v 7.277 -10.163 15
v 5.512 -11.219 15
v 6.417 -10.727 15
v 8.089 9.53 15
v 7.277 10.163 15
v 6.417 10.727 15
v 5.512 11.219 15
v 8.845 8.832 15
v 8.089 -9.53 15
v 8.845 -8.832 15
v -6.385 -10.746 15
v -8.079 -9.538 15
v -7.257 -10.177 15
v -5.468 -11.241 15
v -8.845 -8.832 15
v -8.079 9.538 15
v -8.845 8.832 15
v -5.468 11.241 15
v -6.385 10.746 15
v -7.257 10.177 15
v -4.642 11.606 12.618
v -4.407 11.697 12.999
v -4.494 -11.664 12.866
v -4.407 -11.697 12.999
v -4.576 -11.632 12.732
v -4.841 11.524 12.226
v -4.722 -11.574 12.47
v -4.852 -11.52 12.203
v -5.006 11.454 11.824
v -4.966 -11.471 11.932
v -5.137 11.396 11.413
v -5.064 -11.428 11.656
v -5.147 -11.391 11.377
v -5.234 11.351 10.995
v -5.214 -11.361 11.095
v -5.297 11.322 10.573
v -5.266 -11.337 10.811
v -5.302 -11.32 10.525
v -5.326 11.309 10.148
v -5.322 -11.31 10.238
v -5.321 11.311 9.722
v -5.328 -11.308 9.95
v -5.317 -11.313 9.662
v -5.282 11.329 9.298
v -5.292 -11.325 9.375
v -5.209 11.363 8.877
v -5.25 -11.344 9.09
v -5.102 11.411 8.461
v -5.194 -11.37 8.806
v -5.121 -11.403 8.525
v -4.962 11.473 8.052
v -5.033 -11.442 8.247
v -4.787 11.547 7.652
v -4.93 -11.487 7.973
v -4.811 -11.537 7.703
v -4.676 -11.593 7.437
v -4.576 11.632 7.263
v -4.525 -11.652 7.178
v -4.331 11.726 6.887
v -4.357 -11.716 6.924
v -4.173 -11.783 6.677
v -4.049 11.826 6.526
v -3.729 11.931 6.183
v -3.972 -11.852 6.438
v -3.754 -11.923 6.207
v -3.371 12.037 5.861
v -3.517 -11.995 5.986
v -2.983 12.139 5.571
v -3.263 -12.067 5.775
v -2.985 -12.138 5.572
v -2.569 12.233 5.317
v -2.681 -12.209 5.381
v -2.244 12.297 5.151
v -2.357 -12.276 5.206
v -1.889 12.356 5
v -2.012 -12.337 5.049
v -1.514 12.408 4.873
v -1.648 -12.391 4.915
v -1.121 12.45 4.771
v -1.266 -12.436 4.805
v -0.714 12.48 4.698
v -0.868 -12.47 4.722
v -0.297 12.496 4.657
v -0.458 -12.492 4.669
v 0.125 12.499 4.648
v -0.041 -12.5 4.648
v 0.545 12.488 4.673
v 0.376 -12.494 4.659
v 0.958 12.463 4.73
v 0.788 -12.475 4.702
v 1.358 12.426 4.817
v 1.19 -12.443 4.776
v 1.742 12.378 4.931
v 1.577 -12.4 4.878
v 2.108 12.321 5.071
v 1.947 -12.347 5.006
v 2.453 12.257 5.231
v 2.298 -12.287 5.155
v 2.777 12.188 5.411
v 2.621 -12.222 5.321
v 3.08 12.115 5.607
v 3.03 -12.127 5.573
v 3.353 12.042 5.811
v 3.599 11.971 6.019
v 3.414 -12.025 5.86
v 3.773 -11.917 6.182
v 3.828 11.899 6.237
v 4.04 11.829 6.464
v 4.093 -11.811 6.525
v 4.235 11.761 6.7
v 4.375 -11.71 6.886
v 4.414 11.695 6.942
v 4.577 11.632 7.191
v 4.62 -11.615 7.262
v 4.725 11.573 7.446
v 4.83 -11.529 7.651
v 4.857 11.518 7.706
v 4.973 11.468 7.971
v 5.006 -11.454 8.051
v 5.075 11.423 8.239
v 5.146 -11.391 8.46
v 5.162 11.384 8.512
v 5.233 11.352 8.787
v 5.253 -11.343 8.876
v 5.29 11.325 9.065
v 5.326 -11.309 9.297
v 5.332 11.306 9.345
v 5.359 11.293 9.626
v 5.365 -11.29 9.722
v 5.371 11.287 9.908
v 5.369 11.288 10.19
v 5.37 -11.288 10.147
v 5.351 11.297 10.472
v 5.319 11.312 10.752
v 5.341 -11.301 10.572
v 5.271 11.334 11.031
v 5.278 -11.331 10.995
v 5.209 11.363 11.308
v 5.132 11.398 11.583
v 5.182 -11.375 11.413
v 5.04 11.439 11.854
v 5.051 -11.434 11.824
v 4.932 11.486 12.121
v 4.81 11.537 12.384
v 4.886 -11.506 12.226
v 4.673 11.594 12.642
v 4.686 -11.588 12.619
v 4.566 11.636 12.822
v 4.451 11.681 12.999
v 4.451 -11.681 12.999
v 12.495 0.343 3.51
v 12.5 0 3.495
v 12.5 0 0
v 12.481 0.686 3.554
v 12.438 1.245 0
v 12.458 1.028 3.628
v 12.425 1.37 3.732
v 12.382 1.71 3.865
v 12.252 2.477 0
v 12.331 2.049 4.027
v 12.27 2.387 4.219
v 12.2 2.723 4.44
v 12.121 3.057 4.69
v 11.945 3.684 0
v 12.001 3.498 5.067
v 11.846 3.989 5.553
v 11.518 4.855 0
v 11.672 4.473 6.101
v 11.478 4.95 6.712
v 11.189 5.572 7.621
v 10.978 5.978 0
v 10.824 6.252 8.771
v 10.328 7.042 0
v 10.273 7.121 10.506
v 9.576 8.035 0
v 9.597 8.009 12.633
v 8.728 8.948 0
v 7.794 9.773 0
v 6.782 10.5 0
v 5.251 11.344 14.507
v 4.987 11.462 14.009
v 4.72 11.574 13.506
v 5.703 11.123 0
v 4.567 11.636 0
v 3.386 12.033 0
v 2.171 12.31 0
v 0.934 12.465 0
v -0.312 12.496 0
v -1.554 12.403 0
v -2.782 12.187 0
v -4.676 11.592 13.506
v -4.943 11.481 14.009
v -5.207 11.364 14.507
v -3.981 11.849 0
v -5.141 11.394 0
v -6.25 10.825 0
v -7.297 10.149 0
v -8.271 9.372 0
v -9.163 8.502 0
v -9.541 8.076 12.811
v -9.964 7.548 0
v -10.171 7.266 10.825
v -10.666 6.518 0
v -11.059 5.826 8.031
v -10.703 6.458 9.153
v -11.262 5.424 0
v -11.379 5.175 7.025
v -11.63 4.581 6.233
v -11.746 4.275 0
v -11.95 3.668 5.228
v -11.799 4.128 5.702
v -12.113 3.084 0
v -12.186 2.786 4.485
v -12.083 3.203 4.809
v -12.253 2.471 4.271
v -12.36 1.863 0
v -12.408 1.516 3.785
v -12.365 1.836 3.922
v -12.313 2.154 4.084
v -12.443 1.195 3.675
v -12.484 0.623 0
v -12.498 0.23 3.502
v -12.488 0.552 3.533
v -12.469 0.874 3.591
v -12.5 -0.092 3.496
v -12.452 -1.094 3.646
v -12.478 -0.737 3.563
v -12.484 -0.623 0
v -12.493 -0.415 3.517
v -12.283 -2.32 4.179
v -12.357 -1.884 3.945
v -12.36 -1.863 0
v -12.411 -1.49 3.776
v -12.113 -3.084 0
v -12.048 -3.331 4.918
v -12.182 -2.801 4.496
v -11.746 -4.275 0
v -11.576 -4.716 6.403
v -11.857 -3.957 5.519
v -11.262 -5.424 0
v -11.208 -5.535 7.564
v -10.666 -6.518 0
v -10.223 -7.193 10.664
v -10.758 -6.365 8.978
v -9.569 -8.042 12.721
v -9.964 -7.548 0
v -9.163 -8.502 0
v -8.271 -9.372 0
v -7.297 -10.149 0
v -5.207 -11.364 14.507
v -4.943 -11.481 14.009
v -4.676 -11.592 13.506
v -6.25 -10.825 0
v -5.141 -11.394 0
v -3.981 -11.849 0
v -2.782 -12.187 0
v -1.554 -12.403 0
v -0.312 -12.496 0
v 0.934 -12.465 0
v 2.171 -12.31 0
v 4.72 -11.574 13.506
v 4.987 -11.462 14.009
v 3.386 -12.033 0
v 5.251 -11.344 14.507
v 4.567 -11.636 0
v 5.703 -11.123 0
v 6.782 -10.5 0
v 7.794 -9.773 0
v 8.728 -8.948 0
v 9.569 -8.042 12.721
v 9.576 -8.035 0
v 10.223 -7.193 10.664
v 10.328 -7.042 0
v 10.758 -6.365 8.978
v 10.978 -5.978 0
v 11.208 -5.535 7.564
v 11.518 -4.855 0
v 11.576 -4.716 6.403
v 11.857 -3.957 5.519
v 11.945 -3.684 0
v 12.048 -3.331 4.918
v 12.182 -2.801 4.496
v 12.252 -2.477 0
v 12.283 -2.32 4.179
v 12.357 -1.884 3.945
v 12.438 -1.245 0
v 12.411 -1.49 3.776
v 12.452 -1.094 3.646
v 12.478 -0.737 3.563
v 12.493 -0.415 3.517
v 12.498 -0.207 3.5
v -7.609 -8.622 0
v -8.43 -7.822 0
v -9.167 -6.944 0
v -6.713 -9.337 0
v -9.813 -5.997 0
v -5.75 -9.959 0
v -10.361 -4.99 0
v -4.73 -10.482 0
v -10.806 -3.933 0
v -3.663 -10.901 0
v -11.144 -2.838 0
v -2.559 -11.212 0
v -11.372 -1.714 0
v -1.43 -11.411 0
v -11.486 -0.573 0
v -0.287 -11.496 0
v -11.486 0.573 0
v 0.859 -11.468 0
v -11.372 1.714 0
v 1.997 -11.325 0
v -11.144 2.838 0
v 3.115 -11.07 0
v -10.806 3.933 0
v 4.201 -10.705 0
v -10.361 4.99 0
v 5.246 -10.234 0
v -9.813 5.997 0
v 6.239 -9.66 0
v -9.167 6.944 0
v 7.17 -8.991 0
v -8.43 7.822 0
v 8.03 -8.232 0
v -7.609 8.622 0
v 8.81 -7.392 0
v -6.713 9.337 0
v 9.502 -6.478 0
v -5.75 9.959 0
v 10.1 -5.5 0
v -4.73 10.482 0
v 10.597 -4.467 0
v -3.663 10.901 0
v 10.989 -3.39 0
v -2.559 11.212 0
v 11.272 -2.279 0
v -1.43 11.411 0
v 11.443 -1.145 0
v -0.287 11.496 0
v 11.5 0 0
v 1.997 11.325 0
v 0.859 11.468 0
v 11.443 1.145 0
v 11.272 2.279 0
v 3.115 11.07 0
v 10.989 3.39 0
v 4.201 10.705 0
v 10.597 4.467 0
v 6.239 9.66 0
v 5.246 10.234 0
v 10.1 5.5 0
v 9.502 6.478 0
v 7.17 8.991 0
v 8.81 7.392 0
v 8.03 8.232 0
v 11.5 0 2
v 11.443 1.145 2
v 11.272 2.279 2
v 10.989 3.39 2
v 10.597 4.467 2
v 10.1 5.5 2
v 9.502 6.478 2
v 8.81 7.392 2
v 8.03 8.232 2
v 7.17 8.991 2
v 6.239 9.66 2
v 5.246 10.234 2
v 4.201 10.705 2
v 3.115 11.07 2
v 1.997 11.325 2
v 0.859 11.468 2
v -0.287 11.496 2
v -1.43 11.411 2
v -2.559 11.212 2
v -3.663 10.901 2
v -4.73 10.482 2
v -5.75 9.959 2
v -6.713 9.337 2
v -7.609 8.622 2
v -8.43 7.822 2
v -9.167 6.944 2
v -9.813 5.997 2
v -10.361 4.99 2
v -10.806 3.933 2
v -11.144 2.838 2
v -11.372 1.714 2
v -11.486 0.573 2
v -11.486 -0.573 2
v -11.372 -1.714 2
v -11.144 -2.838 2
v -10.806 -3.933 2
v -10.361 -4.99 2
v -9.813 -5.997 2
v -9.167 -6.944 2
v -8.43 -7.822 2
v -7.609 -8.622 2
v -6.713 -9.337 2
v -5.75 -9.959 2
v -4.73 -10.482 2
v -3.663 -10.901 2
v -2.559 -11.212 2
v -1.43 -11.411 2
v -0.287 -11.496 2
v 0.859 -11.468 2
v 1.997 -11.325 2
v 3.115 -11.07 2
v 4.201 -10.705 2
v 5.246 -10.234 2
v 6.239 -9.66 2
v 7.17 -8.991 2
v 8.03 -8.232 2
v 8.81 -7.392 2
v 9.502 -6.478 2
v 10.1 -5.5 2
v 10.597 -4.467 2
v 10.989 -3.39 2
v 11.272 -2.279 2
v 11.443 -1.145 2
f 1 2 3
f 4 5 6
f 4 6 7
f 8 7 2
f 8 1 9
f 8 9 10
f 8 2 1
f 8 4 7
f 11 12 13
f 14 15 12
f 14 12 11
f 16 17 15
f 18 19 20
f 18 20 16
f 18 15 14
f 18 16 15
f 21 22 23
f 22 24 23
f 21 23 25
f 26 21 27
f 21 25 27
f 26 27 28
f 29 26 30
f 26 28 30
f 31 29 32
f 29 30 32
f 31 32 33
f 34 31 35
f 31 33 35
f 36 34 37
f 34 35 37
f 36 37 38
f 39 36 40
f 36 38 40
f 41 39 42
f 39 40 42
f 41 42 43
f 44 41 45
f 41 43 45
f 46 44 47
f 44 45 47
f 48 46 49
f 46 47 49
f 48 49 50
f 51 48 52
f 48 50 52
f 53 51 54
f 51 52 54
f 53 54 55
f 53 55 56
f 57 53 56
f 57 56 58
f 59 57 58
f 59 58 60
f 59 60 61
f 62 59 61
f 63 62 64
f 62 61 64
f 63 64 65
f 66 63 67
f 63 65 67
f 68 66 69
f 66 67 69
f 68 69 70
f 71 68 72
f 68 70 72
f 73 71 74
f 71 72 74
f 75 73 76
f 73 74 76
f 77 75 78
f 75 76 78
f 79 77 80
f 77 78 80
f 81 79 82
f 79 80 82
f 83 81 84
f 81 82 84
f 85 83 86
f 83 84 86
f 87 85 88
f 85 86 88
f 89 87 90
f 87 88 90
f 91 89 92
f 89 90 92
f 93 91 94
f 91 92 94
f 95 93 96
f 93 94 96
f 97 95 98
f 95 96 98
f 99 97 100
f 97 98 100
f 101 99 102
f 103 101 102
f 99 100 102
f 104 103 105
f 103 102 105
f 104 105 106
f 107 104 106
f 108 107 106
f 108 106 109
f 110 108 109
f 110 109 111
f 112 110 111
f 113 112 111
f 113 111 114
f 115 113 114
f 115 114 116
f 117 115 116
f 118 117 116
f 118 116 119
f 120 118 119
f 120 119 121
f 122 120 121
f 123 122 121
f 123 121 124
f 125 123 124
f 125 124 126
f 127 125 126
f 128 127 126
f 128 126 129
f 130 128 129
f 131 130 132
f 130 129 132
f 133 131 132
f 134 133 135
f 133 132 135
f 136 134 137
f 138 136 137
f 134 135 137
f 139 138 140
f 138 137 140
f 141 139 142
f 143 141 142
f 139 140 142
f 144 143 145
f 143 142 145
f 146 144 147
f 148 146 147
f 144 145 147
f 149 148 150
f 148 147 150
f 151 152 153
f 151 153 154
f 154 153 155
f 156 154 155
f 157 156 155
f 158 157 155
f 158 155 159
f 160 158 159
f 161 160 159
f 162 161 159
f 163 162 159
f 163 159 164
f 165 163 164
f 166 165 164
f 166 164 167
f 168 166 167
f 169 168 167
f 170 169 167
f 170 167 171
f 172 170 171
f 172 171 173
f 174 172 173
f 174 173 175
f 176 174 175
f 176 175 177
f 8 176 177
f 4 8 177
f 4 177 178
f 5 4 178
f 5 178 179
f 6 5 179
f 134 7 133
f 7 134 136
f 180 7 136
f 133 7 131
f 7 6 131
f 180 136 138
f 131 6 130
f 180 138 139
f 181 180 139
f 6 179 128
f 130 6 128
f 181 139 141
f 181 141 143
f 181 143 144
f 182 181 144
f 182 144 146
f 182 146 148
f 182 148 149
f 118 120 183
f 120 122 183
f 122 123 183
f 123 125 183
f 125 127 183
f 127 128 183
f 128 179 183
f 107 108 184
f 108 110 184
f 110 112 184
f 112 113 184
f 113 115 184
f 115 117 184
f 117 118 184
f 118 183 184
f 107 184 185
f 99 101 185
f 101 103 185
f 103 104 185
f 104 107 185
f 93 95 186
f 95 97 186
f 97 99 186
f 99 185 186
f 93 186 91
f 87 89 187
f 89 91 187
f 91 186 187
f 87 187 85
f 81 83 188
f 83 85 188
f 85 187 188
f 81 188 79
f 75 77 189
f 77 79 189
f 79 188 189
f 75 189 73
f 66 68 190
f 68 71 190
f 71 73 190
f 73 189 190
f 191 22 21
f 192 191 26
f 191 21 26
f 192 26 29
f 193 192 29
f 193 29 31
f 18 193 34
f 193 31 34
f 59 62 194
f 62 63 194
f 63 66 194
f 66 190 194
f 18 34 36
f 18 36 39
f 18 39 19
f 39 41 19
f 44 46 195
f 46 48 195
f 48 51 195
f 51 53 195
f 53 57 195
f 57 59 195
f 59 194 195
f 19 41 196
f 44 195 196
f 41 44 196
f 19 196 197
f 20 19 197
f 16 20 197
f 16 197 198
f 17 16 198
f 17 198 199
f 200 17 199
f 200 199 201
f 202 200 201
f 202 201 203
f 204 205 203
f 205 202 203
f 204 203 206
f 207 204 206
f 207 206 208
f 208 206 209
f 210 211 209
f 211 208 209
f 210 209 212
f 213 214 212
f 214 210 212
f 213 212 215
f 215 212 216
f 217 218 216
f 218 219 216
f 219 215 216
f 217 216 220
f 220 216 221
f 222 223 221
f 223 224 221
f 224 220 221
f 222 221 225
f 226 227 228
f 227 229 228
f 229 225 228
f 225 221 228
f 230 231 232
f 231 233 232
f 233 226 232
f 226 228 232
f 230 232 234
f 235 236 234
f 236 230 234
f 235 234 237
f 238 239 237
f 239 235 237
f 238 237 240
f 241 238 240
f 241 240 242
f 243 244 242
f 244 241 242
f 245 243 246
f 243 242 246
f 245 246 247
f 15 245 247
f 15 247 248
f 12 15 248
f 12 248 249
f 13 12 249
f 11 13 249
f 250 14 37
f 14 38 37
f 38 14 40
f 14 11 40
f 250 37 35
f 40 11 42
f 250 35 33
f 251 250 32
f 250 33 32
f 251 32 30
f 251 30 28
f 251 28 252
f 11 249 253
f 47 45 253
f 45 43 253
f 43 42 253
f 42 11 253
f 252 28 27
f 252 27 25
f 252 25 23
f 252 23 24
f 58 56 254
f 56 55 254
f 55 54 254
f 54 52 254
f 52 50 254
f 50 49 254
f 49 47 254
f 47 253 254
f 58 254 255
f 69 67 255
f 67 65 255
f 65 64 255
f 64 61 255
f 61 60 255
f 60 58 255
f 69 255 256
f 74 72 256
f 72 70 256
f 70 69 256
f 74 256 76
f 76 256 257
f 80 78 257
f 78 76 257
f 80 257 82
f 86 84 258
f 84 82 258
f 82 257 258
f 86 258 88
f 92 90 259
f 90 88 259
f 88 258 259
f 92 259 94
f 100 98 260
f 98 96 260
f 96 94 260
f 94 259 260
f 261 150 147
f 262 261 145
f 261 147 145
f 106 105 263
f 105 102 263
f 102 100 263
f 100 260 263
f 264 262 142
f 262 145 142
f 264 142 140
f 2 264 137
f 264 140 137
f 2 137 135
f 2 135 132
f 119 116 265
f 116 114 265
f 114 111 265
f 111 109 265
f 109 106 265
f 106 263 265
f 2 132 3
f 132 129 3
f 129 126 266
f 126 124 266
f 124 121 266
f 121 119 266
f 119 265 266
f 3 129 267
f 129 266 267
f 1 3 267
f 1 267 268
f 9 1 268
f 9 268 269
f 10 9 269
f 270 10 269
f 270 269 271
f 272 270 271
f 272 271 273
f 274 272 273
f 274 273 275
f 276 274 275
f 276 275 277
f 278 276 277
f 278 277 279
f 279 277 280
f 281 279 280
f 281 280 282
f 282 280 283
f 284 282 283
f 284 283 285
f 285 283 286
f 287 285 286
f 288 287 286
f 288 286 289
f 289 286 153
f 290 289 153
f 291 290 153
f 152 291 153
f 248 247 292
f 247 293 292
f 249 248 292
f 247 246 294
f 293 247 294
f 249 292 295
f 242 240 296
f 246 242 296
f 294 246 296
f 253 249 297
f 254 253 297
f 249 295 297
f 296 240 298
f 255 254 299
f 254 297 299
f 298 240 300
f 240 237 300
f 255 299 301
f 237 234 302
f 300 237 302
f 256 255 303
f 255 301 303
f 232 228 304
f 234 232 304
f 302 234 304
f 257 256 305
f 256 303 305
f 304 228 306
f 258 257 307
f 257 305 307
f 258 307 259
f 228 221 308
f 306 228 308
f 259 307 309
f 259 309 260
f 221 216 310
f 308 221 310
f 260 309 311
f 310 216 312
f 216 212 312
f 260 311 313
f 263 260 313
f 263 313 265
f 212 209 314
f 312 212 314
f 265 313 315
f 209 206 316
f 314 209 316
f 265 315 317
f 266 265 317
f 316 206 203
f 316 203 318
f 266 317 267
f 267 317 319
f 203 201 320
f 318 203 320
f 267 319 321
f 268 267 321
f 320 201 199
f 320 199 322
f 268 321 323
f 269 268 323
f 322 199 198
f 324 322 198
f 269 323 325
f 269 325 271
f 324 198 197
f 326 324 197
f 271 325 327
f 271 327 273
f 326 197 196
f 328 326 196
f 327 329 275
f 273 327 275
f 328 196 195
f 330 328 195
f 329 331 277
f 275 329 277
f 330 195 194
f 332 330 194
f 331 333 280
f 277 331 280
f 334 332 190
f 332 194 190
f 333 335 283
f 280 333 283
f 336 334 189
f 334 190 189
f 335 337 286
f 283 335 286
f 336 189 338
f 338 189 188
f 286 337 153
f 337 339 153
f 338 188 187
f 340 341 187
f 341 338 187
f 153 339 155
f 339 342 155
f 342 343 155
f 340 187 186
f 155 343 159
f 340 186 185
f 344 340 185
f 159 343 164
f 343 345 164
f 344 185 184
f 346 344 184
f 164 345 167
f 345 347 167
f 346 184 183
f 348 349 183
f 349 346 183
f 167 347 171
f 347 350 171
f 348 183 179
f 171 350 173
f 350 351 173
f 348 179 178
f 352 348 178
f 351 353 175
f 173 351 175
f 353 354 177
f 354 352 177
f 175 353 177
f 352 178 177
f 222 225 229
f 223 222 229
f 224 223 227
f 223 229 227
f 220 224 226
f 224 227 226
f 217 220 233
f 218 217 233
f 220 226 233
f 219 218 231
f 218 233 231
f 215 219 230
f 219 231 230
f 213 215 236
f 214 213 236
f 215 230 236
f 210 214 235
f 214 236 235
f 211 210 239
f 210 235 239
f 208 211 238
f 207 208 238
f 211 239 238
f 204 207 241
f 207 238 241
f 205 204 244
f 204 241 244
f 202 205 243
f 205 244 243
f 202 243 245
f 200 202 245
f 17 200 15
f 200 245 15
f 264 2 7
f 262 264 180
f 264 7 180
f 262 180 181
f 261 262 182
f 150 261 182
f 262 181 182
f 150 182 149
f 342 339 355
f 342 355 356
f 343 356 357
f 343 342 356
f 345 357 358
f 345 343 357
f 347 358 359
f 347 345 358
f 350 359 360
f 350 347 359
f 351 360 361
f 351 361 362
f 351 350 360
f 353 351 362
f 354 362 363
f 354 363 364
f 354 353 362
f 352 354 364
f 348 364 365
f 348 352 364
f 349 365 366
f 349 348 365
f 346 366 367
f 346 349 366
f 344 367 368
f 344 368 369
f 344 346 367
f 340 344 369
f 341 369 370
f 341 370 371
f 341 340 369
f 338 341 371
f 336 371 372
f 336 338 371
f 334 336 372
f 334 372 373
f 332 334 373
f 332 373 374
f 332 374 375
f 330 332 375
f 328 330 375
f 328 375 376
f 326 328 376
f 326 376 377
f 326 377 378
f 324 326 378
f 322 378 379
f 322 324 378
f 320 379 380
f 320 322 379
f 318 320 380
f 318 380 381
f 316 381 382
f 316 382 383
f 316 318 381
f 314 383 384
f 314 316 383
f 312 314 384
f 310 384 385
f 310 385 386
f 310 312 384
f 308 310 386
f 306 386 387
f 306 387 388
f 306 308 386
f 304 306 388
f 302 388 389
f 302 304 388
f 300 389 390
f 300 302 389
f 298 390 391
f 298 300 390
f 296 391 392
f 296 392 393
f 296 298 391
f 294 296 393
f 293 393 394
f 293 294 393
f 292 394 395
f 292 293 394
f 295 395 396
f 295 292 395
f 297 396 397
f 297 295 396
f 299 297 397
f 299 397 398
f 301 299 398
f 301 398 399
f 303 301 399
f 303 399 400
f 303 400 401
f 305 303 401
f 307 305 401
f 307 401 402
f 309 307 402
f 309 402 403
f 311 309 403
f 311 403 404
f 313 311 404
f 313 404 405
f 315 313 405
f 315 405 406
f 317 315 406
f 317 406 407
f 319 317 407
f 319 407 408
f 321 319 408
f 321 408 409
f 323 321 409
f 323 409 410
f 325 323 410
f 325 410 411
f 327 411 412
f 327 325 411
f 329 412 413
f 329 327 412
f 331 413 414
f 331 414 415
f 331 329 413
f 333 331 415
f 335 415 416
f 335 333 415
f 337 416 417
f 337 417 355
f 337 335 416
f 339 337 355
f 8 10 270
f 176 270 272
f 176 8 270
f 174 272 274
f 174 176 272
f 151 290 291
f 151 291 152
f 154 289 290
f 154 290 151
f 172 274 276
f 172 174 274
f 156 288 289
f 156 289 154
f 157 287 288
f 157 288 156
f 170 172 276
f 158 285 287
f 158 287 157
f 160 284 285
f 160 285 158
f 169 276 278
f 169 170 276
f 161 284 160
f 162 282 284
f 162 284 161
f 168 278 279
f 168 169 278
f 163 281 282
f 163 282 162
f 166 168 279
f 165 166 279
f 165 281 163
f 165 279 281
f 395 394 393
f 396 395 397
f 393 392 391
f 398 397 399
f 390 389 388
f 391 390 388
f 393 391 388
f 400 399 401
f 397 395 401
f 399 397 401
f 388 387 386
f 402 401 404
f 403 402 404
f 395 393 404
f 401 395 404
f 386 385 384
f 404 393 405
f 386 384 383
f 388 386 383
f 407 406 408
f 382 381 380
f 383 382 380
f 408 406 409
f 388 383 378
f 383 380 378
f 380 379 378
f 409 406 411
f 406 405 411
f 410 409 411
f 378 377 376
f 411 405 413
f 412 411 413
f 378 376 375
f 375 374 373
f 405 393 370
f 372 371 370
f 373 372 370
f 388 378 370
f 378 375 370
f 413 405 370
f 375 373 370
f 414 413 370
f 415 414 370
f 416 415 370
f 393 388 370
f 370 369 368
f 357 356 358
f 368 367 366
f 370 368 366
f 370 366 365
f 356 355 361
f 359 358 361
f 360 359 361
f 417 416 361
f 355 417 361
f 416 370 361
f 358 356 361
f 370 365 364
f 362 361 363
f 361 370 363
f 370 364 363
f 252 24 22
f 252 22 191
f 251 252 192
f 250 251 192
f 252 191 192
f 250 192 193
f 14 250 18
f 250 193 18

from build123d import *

# Parameters (mm, degrees)
F0_R        = 12.5
F1_DEPTH    = 15
F2_R        = 5.35
F3_DEPTH    = 19.7
F4_R        = 11.5
F5_DEPTH    = 2
F6_T1_DEPTH = 43.3845163924
F6_T3_DEPTH = 43.3709168199
F8_DEPTH    = 41


# Not quite as in the source:
# - a fillet or chamfer that OpenCascade refuses, or shapes differently, is made with other operations: its cross-section is extruded or revolved along the edge and cut away or added


with BuildPart() as f1:
    # F0 (on Top) → F1 (new body)
    with BuildSketch(Plane.XY):
        Circle(F0_R)
    extrude(amount=F1_DEPTH)

    # F2 (on Front) → F3 (cut, symmetric)
    with BuildSketch(Plane.XZ):
        with Locations((0.0221527088, 9.997321542)):
            Circle(F2_R)
    extrude(amount=F3_DEPTH, both=True, mode=Mode.SUBTRACT)

    # F4 (on Top) → F5 (cut)
    with BuildSketch(Plane.XY):
        Circle(F4_R)
    extrude(amount=F5_DEPTH, mode=Mode.SUBTRACT)

    # F6: chamfer of 7 on 2 edges, made by hand

    # F6_s2 → F6_t1 (cut)
    with BuildSketch(Plane.XZ.offset(-21.6922581962)):
        with BuildLine():
            Line((-4.2755328164, 12.7512221633), (-5.5992962087, 15.2473673359))
            Line((-5.5992962087, 15.2473673359), (-5.5992962087, 15.3873673359))
            ThreePointArc((-5.5992962087, 15.3873673359), (-3.7366893911, 15.14), (-1.8740825735, 15.14))
            Line((-1.8740825735, 15.14), (-1.8244614633, 14.869088788))
            ThreePointArc((-1.8244614633, 14.869088788), (-3.2288770936, 14.0685504994), (-4.1596371494, 12.6726843102))
            Line((-4.1596371494, 12.6726843102), (-4.2755328164, 12.7512221633))
        make_face()
    extrude(amount=F6_T1_DEPTH, mode=Mode.SUBTRACT)

    # F6_s4 → F6_t3 (cut)
    with BuildSketch(Plane.XZ.offset(-21.6854584099)):
        with BuildLine():
            Line((5.6436016264, 15.2473673359), (4.3198382341, 12.7512221633))
            Line((4.3198382341, 12.7512221633), (4.2039425671, 12.6726843102))
            ThreePointArc((4.2039425671, 12.6726843102), (3.2731825113, 14.0685504994), (1.868766881, 14.869088788))
            Line((1.868766881, 14.869088788), (1.9183879912, 15.14))
            ThreePointArc((1.9183879912, 15.14), (3.7809948088, 15.14), (5.6436016264, 15.3873673359))
            Line((5.6436016264, 15.3873673359), (5.6436016264, 15.2473673359))
        make_face()
    extrude(amount=F6_T3_DEPTH, mode=Mode.SUBTRACT)

    # F7 (on Front) → F8 (cut, symmetric)
    with BuildSketch(Plane.XZ):
        Polygon((22.090458405, 20.6357296556), (7.1151317097, 20.4473696649), (14.5756583661, -3.0394739006), align=None)
        Polygon((-14.5756583661, -3.0394739006), (-7.1151317097, 20.4473696649), (-22.090458405, 20.6357296556), align=None)
    extrude(amount=F8_DEPTH, both=True, mode=Mode.SUBTRACT)


solid = f1.part
